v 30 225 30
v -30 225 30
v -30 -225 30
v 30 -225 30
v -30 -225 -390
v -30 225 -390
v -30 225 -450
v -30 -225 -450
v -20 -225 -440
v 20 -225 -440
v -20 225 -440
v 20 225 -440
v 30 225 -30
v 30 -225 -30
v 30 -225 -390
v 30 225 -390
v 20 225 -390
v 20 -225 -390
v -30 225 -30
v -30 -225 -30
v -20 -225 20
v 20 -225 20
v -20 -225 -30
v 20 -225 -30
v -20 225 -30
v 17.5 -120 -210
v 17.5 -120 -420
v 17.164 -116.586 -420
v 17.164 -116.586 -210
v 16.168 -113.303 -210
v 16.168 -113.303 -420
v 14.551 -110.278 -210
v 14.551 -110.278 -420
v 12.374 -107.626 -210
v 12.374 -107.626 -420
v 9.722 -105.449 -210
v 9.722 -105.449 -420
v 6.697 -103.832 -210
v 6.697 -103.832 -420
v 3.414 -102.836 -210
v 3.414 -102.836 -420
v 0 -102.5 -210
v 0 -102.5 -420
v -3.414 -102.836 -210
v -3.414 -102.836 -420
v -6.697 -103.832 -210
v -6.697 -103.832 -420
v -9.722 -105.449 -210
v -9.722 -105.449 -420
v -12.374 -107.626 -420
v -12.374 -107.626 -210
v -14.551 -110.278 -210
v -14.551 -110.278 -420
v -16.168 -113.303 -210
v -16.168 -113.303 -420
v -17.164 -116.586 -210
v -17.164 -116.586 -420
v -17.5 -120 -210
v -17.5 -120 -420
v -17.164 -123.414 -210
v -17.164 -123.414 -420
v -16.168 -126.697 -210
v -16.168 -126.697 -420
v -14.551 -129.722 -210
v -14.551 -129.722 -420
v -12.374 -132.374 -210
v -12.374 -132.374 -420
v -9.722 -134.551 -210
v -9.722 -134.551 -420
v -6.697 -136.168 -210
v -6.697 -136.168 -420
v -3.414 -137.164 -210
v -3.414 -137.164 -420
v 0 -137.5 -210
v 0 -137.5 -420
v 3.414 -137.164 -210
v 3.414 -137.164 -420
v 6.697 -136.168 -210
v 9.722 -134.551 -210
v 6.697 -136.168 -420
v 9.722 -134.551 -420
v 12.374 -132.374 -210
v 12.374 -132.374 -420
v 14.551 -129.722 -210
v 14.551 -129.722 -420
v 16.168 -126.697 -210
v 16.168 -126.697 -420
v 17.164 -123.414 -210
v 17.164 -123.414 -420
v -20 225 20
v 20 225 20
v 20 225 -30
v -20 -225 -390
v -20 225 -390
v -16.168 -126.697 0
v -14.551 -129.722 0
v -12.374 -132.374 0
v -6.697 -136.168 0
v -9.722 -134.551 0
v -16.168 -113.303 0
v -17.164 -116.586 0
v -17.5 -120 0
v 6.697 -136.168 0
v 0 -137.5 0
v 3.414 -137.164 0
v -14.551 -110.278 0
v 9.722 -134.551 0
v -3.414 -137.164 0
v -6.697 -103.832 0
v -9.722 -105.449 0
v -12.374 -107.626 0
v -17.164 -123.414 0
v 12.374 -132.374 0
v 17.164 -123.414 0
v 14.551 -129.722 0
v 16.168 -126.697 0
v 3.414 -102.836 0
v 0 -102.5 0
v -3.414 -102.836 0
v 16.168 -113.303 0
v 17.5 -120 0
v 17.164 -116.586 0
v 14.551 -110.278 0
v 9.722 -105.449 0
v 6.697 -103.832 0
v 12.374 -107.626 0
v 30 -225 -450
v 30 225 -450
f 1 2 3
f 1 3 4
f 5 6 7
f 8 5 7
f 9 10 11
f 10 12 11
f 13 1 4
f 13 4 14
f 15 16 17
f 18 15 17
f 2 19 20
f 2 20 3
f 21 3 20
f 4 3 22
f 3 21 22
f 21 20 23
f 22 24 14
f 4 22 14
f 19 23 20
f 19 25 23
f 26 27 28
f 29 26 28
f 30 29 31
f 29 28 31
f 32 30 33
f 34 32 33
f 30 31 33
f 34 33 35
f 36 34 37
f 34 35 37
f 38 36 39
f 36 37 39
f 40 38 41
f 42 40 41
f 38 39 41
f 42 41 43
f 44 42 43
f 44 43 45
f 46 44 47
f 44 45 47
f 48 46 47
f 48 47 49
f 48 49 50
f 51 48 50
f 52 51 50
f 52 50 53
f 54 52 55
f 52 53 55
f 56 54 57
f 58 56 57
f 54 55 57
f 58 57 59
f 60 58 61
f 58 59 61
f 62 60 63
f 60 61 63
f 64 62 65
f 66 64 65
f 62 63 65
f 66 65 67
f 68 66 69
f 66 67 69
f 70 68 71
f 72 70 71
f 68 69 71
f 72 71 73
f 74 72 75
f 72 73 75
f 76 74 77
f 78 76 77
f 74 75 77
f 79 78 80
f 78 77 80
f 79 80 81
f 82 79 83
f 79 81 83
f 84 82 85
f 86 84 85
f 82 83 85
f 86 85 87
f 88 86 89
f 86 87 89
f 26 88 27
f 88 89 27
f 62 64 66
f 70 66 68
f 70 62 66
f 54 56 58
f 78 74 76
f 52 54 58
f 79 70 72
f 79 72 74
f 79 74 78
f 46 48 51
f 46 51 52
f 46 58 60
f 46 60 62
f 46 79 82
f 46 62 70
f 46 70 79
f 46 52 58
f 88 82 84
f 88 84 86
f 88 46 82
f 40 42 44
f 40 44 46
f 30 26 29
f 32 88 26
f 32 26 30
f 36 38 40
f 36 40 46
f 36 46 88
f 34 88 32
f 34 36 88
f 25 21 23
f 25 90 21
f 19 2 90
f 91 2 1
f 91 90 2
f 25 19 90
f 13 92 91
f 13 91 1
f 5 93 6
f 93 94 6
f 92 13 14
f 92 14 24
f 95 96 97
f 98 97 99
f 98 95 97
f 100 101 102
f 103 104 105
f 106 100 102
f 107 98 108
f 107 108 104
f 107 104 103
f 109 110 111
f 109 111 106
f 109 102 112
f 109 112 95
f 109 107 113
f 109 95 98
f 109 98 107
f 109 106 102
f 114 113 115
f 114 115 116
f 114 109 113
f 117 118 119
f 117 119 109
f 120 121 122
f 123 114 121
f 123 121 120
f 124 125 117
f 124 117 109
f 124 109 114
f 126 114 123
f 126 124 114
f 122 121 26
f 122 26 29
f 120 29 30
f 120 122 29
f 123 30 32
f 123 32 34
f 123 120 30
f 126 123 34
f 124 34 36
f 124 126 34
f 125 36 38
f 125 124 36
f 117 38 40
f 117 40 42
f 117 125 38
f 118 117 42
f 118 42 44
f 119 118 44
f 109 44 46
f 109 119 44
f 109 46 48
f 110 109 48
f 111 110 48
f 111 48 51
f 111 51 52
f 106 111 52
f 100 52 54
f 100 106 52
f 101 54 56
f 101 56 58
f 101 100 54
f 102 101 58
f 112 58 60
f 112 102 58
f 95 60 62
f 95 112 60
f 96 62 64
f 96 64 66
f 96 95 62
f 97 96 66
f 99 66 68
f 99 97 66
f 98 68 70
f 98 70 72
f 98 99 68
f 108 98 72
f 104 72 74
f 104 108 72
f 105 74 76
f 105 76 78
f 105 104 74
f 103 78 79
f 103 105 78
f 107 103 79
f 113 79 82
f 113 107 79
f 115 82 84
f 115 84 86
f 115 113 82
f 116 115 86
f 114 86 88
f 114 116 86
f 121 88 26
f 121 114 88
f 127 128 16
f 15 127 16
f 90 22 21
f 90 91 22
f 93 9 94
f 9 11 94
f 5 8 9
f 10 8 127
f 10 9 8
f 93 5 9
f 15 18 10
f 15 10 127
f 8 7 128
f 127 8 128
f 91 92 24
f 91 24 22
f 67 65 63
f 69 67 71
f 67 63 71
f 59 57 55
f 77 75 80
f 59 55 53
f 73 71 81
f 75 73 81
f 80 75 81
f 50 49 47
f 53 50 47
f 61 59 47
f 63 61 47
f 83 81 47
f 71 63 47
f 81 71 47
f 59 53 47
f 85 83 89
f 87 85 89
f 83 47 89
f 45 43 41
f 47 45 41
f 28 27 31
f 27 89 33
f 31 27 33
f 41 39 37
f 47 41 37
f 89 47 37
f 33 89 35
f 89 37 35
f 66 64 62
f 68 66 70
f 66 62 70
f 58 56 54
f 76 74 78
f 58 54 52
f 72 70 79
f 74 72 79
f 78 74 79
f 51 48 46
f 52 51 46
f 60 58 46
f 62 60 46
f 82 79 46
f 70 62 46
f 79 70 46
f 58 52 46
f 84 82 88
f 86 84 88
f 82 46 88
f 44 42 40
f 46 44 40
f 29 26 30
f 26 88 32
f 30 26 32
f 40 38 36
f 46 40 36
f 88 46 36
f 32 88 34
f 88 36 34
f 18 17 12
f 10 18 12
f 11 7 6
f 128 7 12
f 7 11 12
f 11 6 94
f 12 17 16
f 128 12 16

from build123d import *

# Parameters (mm, degrees)
BOSS_EXTRUDE1_DEPTH = 225
SKETCH3_R           = 17.5
BOSS_EXTRUDE2_DEPTH = 210


with BuildPart() as part:
    # Sketch2 → Boss-Extrude1 (new body, symmetric)
    with BuildSketch(Plane(origin=(0, 0, 0), x_dir=(1, 0, 0), z_dir=(0, 1, 0))):
        Polygon((-20, 20), (-20, 30), (-30, 30), (-30, -30), (30, -30), (30, 30), (20, 30), (20, 20), (20, -20), (-20, -20), align=None)
    extrude(amount=BOSS_EXTRUDE1_DEPTH, both=True)


with BuildPart() as body_2:
    # Sketch3 → Boss-Extrude2 (new body)
    with BuildSketch(Plane.XY):
        with Locations((0, -120)):
            Circle(SKETCH3_R)
    extrude(amount=-BOSS_EXTRUDE2_DEPTH)


with BuildPart() as body_3:
    # Mirror3: mirrored copy
    add(body_2.part.mirror(Plane(origin=(0, -120, -210), x_dir=(1, 0, 0), z_dir=(0, 0, 1))))


with BuildPart() as body_4:
    # Mirror3 2: mirrored copy
    add(part.part.mirror(Plane(origin=(0, -120, -210), x_dir=(1, 0, 0), z_dir=(0, 0, 1))))


solid = Compound([part.part, body_2.part, body_3.part, body_4.part])
